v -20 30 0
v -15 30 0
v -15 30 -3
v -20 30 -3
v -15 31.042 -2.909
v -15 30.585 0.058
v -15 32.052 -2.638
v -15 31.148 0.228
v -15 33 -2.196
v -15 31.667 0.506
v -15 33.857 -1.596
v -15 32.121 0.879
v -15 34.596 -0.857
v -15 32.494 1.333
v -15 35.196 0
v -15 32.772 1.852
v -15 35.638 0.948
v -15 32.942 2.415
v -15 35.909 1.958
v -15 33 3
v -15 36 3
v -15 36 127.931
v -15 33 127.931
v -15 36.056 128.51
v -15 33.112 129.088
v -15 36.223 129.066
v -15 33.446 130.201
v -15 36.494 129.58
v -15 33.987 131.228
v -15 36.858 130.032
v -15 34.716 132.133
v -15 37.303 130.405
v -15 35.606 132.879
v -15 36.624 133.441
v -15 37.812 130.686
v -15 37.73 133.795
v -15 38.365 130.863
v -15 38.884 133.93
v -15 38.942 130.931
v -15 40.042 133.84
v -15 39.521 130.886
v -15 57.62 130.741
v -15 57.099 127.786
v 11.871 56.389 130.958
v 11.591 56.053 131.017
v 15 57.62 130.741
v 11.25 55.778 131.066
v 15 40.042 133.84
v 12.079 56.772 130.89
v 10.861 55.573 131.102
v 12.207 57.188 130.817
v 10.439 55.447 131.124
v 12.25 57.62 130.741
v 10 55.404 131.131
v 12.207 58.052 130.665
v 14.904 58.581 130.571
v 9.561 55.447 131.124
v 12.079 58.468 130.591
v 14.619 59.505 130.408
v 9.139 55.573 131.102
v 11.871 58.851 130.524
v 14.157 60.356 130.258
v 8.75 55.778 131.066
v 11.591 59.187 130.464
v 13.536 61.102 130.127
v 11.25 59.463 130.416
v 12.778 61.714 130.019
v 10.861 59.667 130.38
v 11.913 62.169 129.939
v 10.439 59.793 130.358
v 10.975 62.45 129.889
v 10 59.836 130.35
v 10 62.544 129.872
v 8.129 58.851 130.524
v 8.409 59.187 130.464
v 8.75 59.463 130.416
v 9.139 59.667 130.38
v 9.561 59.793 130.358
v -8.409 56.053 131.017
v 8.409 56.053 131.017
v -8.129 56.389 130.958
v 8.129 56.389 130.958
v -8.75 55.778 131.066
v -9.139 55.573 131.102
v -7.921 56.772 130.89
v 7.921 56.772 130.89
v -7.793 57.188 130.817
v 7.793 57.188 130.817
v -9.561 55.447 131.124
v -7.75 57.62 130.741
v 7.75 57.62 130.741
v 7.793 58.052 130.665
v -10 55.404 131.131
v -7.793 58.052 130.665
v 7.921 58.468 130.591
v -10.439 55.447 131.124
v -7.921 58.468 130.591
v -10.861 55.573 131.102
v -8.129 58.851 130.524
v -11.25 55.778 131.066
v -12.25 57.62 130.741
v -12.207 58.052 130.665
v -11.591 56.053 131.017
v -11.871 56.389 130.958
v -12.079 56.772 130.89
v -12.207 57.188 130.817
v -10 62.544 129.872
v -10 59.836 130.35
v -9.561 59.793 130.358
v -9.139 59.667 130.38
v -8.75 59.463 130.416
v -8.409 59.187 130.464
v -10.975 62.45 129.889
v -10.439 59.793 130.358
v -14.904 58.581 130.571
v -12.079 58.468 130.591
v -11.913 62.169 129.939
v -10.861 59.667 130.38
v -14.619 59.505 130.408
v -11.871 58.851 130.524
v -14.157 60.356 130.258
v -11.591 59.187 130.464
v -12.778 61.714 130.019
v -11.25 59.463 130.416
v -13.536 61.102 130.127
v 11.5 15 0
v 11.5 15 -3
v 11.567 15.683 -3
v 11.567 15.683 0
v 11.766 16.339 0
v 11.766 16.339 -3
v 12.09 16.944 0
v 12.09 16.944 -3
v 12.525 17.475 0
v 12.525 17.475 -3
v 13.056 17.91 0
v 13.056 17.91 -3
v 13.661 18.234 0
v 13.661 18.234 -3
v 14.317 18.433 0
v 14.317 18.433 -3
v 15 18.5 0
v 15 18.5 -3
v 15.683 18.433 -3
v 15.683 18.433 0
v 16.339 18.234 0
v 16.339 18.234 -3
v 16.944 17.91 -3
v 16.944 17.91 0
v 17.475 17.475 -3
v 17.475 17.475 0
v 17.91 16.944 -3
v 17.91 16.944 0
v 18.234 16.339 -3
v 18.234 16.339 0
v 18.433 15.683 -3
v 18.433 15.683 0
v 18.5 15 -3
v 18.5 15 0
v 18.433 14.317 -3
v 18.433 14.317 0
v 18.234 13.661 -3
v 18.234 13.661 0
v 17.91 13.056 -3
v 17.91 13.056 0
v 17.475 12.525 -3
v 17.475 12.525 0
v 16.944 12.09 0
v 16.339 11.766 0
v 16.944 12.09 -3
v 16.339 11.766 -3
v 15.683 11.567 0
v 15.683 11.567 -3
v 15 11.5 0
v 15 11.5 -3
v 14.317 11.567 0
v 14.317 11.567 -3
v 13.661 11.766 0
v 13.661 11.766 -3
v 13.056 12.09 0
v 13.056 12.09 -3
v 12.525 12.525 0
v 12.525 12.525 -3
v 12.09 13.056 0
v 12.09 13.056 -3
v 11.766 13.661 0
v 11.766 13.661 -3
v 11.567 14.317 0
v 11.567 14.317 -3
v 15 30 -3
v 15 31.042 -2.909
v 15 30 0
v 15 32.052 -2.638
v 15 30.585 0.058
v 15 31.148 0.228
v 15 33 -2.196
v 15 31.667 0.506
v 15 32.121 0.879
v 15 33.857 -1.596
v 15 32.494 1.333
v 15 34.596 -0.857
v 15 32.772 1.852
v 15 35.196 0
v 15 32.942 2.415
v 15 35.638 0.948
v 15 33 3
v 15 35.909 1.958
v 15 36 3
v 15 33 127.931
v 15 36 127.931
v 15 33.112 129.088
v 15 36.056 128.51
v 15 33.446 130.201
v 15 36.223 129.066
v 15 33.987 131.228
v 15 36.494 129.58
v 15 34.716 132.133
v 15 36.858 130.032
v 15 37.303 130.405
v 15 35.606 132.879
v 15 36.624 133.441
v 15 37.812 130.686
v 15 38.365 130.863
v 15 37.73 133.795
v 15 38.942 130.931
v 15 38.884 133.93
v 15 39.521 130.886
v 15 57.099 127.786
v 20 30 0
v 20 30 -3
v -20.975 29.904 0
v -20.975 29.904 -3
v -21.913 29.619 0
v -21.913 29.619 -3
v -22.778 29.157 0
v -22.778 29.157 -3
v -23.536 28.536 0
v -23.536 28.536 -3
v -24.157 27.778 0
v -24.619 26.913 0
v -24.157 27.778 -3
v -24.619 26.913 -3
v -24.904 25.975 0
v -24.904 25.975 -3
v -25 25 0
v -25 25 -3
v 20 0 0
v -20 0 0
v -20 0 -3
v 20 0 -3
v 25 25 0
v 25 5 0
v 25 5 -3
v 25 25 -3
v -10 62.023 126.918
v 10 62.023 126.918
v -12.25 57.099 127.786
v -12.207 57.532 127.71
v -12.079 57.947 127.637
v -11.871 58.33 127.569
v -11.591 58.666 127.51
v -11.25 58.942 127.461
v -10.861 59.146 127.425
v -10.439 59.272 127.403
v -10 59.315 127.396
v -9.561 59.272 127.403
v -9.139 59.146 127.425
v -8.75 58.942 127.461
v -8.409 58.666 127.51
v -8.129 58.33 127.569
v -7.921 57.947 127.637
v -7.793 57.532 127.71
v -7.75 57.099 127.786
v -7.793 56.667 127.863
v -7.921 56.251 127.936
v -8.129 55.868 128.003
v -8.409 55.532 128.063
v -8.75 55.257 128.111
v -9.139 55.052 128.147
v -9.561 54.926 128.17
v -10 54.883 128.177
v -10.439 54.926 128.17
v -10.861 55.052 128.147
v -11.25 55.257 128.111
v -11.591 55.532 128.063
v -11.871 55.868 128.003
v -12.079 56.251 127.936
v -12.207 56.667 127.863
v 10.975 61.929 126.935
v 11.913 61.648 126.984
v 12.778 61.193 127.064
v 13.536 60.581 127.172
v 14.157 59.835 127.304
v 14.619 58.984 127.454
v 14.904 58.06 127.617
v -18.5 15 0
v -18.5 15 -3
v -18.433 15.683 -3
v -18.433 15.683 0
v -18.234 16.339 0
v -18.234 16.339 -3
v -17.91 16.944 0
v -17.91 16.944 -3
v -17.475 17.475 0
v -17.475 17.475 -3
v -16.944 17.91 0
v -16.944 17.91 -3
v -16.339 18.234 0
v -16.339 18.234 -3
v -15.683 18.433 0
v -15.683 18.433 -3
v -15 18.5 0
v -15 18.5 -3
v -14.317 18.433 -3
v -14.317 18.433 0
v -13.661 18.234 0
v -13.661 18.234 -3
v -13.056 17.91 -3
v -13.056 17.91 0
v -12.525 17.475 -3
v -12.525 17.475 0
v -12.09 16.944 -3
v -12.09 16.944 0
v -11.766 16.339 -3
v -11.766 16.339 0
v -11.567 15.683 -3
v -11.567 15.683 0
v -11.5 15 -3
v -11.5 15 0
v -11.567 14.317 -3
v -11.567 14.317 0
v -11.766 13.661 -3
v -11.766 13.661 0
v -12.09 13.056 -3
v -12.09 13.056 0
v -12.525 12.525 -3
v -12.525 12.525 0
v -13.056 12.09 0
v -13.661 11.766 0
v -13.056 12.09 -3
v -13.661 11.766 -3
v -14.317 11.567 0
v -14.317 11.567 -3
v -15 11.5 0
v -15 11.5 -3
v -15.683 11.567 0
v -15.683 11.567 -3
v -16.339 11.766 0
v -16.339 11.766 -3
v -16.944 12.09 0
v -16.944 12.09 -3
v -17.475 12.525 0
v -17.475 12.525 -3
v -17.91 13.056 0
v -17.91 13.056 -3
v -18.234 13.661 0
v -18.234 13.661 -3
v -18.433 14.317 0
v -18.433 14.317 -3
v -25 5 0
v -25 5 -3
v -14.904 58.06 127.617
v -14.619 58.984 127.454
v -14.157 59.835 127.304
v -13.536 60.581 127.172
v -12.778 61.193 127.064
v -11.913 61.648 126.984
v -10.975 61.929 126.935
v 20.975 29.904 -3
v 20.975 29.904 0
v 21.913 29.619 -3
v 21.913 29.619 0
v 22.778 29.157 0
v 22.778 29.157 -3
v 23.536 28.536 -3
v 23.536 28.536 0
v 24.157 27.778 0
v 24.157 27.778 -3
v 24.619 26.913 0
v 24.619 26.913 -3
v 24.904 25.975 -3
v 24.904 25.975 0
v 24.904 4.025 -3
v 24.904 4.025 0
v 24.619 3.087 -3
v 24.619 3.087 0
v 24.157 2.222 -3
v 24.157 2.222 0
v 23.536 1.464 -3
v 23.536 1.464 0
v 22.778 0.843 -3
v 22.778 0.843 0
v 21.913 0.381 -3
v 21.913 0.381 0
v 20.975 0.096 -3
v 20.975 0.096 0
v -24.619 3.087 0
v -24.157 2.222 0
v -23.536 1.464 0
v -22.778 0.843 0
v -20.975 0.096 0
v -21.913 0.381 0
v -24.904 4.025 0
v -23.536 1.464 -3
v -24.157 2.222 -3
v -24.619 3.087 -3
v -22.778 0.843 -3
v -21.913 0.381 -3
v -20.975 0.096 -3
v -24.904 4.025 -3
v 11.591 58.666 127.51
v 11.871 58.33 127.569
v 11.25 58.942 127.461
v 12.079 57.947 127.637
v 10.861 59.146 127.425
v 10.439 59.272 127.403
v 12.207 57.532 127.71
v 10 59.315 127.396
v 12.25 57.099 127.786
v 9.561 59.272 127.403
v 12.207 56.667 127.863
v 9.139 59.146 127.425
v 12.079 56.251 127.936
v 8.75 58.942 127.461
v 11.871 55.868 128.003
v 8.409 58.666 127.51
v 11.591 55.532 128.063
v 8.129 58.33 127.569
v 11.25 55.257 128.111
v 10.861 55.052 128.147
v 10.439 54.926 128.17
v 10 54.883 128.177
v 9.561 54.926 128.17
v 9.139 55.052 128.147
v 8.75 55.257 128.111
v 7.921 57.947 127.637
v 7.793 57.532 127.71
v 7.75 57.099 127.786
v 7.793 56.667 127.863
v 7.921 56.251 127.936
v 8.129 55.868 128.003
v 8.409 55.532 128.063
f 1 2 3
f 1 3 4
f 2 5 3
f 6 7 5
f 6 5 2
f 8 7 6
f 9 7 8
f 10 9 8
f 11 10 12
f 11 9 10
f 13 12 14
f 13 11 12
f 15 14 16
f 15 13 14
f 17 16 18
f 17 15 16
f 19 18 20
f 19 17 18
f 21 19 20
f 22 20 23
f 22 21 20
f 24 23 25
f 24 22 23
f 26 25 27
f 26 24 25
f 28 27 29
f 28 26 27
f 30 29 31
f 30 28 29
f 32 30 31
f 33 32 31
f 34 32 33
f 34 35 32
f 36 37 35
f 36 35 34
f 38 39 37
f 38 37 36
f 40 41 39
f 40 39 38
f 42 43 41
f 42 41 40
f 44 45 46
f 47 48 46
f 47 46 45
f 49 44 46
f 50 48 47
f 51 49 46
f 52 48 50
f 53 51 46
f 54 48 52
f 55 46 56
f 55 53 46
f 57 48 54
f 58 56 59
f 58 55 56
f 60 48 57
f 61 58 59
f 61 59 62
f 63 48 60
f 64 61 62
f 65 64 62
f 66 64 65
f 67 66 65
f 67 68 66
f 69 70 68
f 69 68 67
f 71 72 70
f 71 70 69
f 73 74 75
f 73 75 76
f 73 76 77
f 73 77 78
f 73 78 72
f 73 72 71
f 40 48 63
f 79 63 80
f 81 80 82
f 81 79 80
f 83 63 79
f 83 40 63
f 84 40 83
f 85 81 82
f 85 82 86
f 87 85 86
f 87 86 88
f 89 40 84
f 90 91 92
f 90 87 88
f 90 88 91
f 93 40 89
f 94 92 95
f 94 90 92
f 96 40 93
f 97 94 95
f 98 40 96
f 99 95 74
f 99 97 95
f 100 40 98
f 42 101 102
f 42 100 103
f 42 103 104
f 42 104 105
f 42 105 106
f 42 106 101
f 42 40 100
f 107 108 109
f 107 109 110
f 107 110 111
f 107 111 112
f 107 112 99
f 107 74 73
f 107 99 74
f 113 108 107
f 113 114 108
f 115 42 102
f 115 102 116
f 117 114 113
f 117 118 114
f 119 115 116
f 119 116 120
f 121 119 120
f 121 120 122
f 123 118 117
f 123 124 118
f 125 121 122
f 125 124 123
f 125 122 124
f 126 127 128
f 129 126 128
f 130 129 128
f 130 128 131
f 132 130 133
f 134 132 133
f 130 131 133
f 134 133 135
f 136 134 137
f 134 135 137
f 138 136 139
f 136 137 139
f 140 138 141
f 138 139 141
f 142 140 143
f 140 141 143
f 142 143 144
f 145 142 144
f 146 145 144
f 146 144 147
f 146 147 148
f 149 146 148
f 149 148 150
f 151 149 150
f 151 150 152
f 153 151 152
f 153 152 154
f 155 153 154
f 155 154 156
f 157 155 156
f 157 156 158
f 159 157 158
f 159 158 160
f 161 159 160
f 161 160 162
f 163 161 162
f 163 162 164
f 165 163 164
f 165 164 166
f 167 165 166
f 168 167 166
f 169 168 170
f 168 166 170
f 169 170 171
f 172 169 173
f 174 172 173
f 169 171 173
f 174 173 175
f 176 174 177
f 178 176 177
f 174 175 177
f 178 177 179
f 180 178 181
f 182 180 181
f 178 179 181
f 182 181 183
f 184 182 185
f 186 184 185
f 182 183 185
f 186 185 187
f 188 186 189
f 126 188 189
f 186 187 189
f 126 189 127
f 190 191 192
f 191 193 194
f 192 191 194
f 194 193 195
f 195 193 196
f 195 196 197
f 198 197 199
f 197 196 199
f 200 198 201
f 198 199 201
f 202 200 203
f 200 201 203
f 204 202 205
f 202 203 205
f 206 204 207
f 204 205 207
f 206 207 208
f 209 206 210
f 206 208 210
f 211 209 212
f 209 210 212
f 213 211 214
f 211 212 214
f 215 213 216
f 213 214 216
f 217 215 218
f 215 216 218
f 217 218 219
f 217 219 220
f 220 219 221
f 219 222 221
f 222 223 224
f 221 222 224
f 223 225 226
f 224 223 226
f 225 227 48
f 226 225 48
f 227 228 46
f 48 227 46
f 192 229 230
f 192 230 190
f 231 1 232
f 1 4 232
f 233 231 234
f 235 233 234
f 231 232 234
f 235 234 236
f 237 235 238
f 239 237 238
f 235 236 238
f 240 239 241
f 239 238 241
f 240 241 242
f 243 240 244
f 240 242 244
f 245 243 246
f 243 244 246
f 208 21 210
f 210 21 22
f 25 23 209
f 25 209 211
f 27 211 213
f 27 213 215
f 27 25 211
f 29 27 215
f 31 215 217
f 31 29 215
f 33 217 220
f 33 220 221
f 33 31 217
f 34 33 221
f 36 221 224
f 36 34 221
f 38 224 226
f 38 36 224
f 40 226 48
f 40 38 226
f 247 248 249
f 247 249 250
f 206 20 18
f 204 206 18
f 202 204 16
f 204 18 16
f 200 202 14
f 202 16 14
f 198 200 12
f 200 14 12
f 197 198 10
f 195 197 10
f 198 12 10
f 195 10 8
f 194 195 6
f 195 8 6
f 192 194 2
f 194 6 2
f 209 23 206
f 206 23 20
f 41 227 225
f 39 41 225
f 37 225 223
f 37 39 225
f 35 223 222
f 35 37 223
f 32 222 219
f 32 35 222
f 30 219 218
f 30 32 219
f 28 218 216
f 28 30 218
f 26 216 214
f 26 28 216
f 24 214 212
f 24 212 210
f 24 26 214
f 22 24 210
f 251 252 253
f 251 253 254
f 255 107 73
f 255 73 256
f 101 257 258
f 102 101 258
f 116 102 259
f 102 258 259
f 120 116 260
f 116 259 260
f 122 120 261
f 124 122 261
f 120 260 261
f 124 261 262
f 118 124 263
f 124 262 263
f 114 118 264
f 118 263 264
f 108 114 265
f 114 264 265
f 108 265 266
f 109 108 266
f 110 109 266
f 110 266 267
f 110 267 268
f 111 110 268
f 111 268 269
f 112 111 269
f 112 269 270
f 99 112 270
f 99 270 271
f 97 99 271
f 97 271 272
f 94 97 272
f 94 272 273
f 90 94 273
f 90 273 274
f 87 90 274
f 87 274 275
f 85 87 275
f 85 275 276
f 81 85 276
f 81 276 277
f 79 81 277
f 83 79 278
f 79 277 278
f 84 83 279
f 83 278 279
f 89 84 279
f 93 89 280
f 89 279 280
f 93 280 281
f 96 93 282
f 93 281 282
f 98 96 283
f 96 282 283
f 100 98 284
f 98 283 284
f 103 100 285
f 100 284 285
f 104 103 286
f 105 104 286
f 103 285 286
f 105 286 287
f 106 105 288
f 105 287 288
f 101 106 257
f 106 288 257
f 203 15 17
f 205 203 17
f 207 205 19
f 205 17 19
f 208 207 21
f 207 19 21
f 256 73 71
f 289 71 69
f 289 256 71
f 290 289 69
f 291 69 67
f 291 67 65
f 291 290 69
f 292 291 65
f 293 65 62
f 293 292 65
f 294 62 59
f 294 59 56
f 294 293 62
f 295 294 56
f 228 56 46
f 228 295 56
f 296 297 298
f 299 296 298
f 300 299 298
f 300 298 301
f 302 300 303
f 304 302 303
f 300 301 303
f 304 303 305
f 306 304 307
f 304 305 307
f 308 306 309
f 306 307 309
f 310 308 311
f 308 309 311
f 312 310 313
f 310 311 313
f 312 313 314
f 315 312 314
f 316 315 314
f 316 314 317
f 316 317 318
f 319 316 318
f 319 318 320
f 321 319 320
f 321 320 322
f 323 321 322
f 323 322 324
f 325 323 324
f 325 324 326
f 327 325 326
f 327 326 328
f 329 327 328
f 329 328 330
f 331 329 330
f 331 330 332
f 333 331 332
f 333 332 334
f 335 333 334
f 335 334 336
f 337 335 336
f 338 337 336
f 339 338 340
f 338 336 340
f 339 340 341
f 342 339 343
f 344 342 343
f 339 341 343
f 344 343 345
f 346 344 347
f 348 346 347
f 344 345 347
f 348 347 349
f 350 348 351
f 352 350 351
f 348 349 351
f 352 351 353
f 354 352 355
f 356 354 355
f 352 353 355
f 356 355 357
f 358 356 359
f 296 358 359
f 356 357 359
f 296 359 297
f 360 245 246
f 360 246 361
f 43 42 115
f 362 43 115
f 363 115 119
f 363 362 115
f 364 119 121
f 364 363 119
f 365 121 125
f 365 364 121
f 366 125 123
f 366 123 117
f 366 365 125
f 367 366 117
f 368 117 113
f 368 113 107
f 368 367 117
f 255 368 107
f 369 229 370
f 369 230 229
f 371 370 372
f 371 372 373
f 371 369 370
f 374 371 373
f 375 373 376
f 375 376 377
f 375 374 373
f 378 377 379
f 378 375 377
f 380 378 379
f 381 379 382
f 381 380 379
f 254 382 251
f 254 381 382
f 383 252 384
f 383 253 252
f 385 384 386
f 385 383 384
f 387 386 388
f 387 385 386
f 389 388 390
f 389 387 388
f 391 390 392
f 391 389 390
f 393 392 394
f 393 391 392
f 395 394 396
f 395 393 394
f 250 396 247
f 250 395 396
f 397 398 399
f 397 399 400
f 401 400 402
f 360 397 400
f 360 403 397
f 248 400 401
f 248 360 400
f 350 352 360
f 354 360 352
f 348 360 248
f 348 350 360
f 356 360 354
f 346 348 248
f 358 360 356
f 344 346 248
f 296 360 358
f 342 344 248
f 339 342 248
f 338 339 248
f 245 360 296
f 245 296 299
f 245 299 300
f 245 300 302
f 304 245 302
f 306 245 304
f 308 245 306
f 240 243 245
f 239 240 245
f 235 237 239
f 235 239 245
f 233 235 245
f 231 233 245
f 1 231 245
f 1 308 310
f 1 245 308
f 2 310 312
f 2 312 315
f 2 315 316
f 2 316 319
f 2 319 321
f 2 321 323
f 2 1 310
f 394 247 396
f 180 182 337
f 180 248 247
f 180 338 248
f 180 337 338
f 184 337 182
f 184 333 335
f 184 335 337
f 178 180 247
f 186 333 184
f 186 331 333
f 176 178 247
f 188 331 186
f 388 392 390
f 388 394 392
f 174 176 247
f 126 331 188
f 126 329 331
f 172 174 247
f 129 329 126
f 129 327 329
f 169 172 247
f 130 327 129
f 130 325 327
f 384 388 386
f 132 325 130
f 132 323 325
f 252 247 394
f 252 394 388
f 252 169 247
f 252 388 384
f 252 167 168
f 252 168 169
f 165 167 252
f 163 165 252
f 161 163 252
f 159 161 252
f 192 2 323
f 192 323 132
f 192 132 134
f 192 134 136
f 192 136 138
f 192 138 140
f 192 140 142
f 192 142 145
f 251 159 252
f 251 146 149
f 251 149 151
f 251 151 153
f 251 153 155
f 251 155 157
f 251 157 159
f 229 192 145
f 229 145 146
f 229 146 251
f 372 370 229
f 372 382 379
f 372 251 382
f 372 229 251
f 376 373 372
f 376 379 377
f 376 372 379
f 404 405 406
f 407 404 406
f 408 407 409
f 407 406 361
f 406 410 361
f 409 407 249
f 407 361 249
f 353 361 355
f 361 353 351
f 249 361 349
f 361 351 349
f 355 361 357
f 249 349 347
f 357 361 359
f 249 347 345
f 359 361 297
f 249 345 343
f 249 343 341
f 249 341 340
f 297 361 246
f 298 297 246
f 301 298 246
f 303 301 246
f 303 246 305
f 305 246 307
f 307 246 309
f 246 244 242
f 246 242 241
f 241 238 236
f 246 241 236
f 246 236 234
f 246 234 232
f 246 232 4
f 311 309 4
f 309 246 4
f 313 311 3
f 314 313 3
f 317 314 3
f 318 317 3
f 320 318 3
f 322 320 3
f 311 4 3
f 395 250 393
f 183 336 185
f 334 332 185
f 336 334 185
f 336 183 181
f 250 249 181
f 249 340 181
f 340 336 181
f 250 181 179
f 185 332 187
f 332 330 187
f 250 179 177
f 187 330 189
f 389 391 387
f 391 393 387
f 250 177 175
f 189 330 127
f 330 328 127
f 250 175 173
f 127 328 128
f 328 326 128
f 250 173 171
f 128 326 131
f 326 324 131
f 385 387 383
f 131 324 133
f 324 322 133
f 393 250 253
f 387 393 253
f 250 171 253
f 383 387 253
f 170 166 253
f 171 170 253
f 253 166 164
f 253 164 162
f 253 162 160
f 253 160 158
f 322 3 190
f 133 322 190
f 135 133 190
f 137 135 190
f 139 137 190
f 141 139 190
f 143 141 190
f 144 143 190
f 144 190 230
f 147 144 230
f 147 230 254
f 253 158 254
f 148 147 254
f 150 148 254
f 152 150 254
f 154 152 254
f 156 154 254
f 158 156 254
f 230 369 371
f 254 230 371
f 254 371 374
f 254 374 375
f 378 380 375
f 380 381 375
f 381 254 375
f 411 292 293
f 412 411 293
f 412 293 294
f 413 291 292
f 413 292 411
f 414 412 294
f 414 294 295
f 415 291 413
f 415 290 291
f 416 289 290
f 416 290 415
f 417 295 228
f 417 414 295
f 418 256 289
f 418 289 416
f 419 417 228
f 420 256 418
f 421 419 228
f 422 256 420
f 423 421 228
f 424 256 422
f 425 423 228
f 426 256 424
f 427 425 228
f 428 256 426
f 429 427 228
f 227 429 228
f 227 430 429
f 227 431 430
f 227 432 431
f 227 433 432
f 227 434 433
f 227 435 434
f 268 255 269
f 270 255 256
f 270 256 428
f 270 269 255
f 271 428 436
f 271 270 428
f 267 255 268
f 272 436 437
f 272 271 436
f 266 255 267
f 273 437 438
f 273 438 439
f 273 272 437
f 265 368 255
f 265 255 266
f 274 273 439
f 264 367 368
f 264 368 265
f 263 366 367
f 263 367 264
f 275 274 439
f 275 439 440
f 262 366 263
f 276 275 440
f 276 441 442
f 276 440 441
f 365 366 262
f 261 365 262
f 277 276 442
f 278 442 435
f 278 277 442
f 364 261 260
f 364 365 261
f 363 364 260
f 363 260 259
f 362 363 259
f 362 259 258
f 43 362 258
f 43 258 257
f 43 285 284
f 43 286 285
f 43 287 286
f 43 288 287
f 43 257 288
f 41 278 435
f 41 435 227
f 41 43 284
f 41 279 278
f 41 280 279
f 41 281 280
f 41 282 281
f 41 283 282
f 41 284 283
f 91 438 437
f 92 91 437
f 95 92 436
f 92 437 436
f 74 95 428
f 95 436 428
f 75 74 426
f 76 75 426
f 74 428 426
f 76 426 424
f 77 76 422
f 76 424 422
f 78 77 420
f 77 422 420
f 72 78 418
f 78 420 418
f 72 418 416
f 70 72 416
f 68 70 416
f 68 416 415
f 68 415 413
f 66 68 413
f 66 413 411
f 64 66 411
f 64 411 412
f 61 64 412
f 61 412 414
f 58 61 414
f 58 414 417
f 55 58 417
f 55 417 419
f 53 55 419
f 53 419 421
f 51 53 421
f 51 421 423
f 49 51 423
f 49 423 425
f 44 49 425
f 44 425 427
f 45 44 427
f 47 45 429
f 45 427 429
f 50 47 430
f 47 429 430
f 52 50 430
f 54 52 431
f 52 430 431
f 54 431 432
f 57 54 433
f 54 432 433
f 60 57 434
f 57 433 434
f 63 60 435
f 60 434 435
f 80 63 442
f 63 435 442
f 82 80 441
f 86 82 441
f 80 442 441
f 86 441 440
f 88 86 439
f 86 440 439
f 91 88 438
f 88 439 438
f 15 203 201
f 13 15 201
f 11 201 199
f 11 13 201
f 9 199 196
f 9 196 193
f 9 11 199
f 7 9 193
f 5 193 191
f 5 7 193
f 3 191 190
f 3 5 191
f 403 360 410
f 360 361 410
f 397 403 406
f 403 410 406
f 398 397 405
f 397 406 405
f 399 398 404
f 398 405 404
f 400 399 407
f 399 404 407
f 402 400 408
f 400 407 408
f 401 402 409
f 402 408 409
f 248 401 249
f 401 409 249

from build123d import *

# Parameters (mm, degrees)
SM_BASE_FLANGE_1_DEPTH = 3
HOLE_WIZARD_M61_D      = 7
OTHER_START            = -15
OTHER_1_DEPTH          = 30
OTHER_1_2_DEPTH        = 30
SM_EDGE_FLANGE_1_DEPTH = 30
HOLE_WIZARD_M41_D      = 4.5
HOLE_WIZARD_M41_DEPTH  = 3
FILLET_1_R             = 5
FILLET_2_R             = 5


# Read off the part's stored shape, not the designer's step: Нарисованный сгиб1
# Sheet-metal steps are written as plain solids
with BuildPart() as part:
    # Sketch 1 → Базовая кромка1 (new body)
    with BuildSketch(Plane.XY):
        Polygon((15, 30), (15, 162), (-15, 162), (-15, 30), (-25, 30), (-25, 0), (25, 0), (25, 30), align=None)
    extrude(amount=-SM_BASE_FLANGE_1_DEPTH)

    # Сверло под метчик  спиральное M61 (through all)
    with Locations(Plane.XY):
        with Locations((-15, 15), (15, 15)):
            Hole(HOLE_WIZARD_M61_D / 2)

    # Other 1 outline → Other 1 (cut)
    with BuildSketch(Plane.YZ.offset(OTHER_START)):
        with BuildLine():
            Line((162, 0), (35.196152423, 0))
            ThreePointArc((35.196152423, 0), (33, -2.196152423), (30, -3))
            Line((30, -3), (162, -3))
            Line((162, -3), (162, 0))
        make_face()
    extrude(amount=OTHER_1_DEPTH, mode=Mode.SUBTRACT)

    # Other 1 2 outline → Other 1 2 (add)
    with BuildSketch(Plane.YZ.offset(OTHER_START)):
        with BuildLine():
            Line((36, 3), (36, 127.931416529))
            Line((36, 127.931416529), (33, 127.931416529))
            Line((33, 127.931416529), (33, 3))
            ThreePointArc((33, 3), (32.121320344, 0.878679656), (30, 0))
            Line((30, 0), (35.196152423, 0))
            ThreePointArc((35.196152423, 0), (35.795554958, 1.447085729), (36, 3))
        make_face()
    extrude(amount=OTHER_1_2_DEPTH)

    # Ребро-кромка1 section (across the edge) → Ребро-кромка1 (add)
    with BuildSketch(Plane(origin=(-15, 36, 131.506677307), x_dir=(0, -0.17364817766692373, -0.9848077530122094), z_dir=(1, 0, 0))):
        with BuildLine():
            Line((-3, 3.575260778), (-3, 26.424739222))
            Line((-3, 26.424739222), (0, 26.424739222))
            Line((0, 26.424739222), (0, 3.575260778))
            ThreePointArc((0, 3.575260778), (1.071637171, 1.277127448), (3.520944533, 0.620837519))
            Line((3.520944533, 0.620837519), (4.041889066, -2.33358574))
            ThreePointArc((4.041889066, -2.33358574), (-0.856725658, -1.021005881), (-3, 3.575260778))
        make_face()
    extrude(amount=SM_EDGE_FLANGE_1_DEPTH)

    # Отверстие с зазором M41
    with Locations(Plane(origin=(0, 24.095443669, 136.652051617), x_dir=(1, 0, 0), z_dir=(0, 0.17364817766692325, 0.9848077530122094))):
        with Locations((-10, 34.041923465), (10, 34.041923465)):
            Hole(HOLE_WIZARD_M41_D / 2, depth=HOLE_WIZARD_M41_DEPTH)

    # Скругление1
    fillet_1_edges = [part.edges().sort_by_distance(p)[0] for p in [
        (-25, 0, -1.5),
        (25, 0, -1.5),
        (25, 30, -1.5),
        (-25, 30, -1.5),
    ]]
    fillet(fillet_1_edges, radius=FILLET_1_R)

    # Скругление2
    fillet_2_edges = [part.edges().sort_by_distance(p)[0] for p in [
        (-15, 62.283760324, 128.395281125),
        (15, 62.283760324, 128.395281125),
    ]]
    fillet(fillet_2_edges, radius=FILLET_2_R)


solid = part.part
